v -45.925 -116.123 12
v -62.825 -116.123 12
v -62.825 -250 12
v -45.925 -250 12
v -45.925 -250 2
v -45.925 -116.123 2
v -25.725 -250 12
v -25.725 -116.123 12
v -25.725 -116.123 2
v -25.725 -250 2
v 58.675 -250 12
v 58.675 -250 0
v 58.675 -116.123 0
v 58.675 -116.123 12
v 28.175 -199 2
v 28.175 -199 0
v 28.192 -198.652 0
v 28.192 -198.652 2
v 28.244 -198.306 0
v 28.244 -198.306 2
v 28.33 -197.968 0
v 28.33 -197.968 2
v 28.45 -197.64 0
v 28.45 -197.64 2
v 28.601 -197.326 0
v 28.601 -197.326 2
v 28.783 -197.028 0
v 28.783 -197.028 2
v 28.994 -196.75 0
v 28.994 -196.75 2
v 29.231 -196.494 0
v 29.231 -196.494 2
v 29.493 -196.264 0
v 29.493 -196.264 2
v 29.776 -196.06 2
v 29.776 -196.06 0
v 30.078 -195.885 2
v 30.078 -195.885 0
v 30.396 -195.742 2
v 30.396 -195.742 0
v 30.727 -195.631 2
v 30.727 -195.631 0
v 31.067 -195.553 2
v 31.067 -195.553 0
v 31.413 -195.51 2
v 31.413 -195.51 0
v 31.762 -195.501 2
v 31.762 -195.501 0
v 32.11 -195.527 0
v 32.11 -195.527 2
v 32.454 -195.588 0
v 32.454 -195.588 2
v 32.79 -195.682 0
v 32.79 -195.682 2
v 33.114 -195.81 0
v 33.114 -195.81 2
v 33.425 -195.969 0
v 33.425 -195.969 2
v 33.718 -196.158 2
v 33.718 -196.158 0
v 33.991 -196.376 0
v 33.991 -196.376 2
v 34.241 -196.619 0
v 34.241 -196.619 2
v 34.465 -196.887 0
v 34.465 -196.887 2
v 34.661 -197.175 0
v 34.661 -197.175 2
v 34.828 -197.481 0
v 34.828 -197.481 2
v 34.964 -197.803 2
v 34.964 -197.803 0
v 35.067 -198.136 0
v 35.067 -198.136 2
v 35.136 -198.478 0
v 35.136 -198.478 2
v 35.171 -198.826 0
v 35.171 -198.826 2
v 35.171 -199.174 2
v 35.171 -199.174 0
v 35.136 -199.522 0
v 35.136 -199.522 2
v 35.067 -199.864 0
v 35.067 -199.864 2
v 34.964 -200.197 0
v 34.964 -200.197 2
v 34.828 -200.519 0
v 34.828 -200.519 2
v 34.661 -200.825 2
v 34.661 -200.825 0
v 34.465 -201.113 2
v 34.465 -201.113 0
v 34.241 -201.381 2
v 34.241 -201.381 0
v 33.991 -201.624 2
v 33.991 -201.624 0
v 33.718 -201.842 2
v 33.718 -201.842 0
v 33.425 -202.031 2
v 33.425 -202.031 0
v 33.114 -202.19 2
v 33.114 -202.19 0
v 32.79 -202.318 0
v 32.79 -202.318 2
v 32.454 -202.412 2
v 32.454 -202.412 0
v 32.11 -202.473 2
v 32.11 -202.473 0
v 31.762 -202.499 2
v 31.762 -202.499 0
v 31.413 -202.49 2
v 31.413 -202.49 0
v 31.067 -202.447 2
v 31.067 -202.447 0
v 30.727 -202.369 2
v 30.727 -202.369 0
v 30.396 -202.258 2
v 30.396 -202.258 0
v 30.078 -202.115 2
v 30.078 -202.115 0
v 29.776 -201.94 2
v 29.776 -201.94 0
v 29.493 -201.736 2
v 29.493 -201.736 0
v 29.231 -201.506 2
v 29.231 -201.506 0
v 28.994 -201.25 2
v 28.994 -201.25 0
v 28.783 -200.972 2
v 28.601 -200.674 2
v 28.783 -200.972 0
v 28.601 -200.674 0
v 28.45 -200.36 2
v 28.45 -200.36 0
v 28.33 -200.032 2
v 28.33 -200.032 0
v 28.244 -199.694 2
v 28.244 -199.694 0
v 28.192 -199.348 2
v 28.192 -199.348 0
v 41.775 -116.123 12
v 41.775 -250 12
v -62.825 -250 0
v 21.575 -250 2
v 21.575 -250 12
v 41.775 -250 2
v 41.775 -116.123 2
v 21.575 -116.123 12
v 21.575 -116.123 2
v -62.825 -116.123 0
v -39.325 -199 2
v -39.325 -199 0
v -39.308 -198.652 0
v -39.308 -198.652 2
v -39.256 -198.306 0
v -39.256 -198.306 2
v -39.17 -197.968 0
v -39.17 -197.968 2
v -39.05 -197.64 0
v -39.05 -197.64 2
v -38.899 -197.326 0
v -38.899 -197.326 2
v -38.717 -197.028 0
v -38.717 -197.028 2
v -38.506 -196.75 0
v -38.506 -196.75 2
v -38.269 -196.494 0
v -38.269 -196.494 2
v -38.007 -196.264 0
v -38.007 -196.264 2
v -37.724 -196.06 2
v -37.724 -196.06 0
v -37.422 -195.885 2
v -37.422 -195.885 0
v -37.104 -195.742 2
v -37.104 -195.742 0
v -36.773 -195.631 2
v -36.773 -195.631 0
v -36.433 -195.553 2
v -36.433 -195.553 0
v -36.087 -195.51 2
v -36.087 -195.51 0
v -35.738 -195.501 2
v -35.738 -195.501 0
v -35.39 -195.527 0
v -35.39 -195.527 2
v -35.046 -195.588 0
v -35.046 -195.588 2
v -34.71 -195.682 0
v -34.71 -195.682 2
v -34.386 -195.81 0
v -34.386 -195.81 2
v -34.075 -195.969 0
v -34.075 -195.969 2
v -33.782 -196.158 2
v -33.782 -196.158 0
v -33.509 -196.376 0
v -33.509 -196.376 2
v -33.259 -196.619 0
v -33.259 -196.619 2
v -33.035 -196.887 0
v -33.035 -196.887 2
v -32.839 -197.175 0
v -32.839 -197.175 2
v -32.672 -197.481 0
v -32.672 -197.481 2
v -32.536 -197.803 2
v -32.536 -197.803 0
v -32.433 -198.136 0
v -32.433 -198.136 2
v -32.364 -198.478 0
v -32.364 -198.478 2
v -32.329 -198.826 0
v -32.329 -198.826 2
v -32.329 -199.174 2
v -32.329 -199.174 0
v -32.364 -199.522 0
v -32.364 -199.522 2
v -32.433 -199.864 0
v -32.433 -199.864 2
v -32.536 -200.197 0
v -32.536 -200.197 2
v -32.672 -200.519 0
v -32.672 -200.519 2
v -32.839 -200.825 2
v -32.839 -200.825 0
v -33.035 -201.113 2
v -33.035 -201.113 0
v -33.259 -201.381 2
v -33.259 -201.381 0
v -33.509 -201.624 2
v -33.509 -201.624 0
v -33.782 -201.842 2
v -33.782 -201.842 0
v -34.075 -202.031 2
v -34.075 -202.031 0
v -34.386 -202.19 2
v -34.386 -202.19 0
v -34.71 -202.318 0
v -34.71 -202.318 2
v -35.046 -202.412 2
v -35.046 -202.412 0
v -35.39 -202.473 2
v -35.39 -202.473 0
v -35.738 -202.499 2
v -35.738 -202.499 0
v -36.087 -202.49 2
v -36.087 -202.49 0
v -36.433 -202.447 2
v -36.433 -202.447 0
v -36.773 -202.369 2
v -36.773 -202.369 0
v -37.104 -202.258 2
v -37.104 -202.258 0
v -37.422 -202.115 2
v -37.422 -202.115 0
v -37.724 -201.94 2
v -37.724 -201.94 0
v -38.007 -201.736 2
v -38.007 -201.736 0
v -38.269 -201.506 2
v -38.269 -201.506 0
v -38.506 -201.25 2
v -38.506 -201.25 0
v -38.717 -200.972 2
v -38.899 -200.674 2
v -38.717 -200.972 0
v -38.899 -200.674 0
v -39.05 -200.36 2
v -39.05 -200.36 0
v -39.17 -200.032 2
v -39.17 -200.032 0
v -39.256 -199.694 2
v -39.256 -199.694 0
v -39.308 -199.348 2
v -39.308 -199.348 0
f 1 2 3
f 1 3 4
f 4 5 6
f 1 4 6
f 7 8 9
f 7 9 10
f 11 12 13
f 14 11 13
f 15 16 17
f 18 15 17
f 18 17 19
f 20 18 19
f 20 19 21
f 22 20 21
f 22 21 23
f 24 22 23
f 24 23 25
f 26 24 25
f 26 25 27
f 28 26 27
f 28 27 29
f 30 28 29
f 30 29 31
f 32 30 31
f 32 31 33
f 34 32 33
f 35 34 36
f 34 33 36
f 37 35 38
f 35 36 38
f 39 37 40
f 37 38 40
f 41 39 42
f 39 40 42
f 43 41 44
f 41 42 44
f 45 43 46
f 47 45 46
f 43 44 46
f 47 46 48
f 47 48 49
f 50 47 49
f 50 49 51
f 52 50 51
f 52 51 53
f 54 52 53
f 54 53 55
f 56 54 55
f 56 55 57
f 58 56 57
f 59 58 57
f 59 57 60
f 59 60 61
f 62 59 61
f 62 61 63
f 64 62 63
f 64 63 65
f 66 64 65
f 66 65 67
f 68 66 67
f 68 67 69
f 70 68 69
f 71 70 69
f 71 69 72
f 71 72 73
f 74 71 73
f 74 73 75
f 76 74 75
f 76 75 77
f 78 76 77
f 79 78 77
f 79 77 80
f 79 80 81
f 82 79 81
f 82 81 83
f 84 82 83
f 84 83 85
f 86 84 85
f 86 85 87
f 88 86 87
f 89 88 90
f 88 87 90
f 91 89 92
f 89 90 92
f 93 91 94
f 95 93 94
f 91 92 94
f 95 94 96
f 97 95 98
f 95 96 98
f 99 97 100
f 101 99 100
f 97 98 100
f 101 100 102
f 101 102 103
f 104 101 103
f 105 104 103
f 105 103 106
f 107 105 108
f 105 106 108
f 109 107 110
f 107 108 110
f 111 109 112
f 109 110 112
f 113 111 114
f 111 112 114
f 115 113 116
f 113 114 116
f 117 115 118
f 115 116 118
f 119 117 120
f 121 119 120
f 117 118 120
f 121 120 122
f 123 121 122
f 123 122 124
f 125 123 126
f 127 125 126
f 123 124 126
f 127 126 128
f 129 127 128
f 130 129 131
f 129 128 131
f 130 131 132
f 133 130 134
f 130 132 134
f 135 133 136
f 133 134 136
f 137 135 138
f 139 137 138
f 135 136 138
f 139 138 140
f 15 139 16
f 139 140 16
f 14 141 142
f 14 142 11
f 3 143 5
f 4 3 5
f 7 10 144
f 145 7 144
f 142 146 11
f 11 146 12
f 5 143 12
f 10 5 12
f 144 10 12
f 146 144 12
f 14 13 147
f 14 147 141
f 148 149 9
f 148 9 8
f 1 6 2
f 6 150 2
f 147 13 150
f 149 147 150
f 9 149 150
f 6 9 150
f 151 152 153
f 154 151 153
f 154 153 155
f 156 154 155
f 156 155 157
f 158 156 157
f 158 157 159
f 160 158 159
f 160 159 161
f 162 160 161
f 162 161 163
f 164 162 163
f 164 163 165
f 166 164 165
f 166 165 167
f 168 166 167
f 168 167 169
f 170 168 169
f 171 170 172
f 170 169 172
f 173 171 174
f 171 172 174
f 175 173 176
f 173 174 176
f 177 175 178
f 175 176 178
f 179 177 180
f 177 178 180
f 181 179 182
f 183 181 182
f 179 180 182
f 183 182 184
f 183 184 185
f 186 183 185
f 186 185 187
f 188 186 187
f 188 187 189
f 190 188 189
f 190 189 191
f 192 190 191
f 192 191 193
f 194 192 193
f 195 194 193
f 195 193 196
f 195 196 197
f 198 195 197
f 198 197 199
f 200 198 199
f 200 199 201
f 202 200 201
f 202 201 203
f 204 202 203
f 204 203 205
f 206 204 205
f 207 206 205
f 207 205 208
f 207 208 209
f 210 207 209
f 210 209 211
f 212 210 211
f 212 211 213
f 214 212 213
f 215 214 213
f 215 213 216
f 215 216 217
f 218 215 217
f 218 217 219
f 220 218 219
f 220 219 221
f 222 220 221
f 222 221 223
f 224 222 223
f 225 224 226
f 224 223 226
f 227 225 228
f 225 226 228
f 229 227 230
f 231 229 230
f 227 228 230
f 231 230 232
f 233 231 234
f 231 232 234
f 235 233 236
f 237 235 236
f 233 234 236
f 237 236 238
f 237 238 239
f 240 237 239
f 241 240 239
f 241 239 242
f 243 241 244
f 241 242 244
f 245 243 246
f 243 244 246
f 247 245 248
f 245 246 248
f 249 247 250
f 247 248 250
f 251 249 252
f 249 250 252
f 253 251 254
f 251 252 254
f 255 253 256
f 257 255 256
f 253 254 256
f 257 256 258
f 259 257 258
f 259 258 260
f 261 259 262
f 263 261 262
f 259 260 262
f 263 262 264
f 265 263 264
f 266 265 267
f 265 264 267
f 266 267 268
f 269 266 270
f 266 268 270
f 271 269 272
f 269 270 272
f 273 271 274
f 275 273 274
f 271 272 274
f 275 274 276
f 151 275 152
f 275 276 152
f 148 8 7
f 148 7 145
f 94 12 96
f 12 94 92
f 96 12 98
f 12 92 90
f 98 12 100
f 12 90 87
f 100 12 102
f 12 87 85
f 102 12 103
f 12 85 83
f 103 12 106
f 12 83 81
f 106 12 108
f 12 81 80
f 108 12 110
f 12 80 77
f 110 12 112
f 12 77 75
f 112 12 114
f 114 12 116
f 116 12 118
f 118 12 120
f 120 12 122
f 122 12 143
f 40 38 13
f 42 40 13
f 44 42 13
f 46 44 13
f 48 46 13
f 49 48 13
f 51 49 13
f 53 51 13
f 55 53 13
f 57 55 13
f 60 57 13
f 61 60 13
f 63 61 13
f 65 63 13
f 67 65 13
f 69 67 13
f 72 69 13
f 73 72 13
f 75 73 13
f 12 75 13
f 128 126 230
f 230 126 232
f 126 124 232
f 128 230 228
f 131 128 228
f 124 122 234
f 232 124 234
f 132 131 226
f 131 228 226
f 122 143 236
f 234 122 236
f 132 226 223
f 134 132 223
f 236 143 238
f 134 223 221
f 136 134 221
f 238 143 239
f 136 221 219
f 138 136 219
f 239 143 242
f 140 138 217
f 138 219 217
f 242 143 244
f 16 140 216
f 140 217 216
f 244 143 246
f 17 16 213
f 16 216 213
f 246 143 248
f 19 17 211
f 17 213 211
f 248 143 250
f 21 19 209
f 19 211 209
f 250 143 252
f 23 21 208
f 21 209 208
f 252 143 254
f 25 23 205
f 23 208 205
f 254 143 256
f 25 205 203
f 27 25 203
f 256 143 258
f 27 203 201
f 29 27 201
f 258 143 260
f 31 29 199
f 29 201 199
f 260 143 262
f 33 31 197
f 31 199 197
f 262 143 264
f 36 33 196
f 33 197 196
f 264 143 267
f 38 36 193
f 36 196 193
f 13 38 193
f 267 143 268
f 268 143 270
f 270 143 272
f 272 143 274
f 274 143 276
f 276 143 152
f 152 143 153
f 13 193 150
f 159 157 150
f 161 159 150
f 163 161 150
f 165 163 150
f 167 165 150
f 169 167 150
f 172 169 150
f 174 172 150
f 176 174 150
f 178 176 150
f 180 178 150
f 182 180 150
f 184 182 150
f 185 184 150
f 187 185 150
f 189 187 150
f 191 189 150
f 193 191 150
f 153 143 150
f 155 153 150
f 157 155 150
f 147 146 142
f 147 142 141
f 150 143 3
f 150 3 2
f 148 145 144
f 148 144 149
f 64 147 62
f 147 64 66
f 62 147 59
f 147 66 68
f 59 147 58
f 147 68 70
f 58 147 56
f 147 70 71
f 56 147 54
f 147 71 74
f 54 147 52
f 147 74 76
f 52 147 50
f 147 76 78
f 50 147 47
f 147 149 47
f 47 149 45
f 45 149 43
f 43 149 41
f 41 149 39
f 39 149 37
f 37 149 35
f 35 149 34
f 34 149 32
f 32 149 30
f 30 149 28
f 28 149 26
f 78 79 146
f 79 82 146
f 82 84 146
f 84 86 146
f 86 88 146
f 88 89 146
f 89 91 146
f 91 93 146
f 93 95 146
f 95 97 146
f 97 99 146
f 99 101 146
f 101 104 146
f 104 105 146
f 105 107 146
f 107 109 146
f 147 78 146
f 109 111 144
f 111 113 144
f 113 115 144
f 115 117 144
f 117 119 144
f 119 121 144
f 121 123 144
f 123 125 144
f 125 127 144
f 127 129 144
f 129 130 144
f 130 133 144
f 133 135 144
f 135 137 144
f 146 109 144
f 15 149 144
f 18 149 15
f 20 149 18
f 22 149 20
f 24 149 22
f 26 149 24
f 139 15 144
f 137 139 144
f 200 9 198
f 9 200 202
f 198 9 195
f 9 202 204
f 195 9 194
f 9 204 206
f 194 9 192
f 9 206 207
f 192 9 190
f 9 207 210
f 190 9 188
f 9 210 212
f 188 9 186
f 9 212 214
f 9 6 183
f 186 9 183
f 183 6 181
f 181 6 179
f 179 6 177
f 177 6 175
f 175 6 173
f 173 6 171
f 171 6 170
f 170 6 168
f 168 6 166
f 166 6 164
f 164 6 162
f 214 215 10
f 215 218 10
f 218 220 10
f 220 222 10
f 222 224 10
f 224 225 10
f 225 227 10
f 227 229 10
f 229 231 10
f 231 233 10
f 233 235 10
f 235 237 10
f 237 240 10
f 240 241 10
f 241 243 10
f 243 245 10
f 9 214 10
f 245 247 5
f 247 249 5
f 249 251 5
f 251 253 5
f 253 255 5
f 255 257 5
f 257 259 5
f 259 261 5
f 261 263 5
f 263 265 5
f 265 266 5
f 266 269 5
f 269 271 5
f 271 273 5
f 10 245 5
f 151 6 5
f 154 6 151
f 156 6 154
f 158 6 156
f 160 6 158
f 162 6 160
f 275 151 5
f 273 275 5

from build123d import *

# Parameters (mm, degrees)
F1_DEPTH  = 250
F2_W      = 87.5
F2_H      = 12
F3_DEPTH  = 20
F5_D      = 7
F5_DEPTH  = 40
F5_TIP    = 2.1030121666
F7_DEPTH  = 17
F8_DEPTH  = 17
F9_W      = 16.9
F9_H      = 250
F10_DEPTH = 10
F11_W     = 16.9
F11_H     = 250
F12_DEPTH = 10
F14_DEPTH = 25
F15_R     = 5
F18_W     = 250
F18_H     = 10
F19_DEPTH = 0.1
F20_W     = 250
F20_H     = 10
F21_DEPTH = 0.1
F22_W     = 143.5878481716
F22_H     = 63.6908710003
F23_DEPTH = 259


with BuildPart() as f1:
    # F0 (on Front) → F1 (new body)
    with BuildSketch(Plane.XZ):
        Polygon((-45.825098525, 2), (-45.825098525, 0), (41.674901475, 0), (41.674901475, 2), (21.674901475, 2), (21.674901475, 12), (-25.825098525, 12), (-25.825098525, 2), align=None)
    extrude(amount=F1_DEPTH)

    # F2 (on face) → F3 (join)
    with BuildSketch(Plane(origin=(0, 0, 0), x_dir=(-1, 0, 0), z_dir=(0, 1, 0))):
        with Locations((2.075098525, 6)):
            Rectangle(F2_W, F2_H)
    extrude(amount=F3_DEPTH)

    # F5
    with Locations(Plane.XY.offset(2)):
        with Locations((-35.825098525, -51), (31.674901475, -199), (31.674901475, -51), (-35.825098525, -199)):
            Hole(F5_D / 2, depth=F5_DEPTH)
            with Locations((0, 0, -(F5_DEPTH + F5_TIP / 2))):  # 118° drill point
                Cone(0, F5_D / 2, F5_TIP, mode=Mode.SUBTRACT)

    # F7 (add): a face of the model
    f7_faces = [f1.faces().sort_by_distance(p)[0] for p in [
        (-45.825098525, -125, 1.7297334649),
    ]]
    extrude(f7_faces, amount=F7_DEPTH)

    # F6 (on face) → F8 (join)
    with BuildSketch(Plane.YZ.offset(41.674901475)):
        Polygon((0, 2), (-250, 2), (-250, 0), (20, 0), (20, 12), (0, 12), align=None)
    extrude(amount=F8_DEPTH)

    # F9 (on face) → F10 (join)
    with BuildSketch(Plane.XY.offset(2)):
        with Locations((50.224901475, -125)):
            Rectangle(F9_W, F9_H)
    extrude(amount=F10_DEPTH)

    # F11 (on face) → F12 (join)
    with BuildSketch(Plane.XY.offset(2)):
        with Locations((-54.375098525, -125)):
            Rectangle(F11_W, F11_H)
    extrude(amount=F12_DEPTH)

    # F13 (on face) → F14 (cut)
    with BuildSketch(Plane.XY.offset(12)):
        with BuildLine():
            ThreePointArc((-62.825098525, 0), (-37.10740093, 13.9610044228), (-8.4745501026, 20))
            Line((-8.4745501026, 20), (-62.825098525, 20))
            Line((-62.825098525, 20), (-62.825098525, 0))
        make_face()
        with BuildLine():
            ThreePointArc((4.3243530527, 20), (32.95720388, 13.9610044228), (58.674901475, 0))
            Line((58.674901475, 0), (58.674901475, 20))
            Line((58.674901475, 20), (4.3243530527, 20))
        make_face()
    extrude(amount=-F14_DEPTH, mode=Mode.SUBTRACT)

    # F15
    f15_edges = [f1.edges().sort_by_distance(p)[0] for p in [
        (-37.107401, 13.961004, 12),
        (-2.075099, 20, 12),
        (32.957204, 13.961004, 12),
    ]]
    fillet(f15_edges, radius=F15_R)

    # F18 (on face) → F19 (cut)
    with BuildSketch(Plane.YZ.offset(21.674901475)):
        with Locations((-125, 7)):
            Rectangle(F18_W, F18_H)
    extrude(amount=-F19_DEPTH, mode=Mode.SUBTRACT)

    # F20 (on face) → F21 (cut)
    with BuildSketch(Plane(origin=(-25.825098525, 0, 0), x_dir=(0, -1, 0), z_dir=(-1, 0, 0))):
        with Locations((125, 7)):
            Rectangle(F20_W, F20_H)
    extrude(amount=-F21_DEPTH, mode=Mode.SUBTRACT)

    # F22 (on offset) → F23 (cut)
    with BuildSketch(Plane(origin=(-112.825098525, 0, 0), x_dir=(0, -1, 0), z_dir=(-1, 0, 0))):
        with Locations((44.3292455748, 5.149319768)):
            Rectangle(F22_W, F22_H)
    extrude(amount=-F23_DEPTH, mode=Mode.SUBTRACT)


solid = f1.part
